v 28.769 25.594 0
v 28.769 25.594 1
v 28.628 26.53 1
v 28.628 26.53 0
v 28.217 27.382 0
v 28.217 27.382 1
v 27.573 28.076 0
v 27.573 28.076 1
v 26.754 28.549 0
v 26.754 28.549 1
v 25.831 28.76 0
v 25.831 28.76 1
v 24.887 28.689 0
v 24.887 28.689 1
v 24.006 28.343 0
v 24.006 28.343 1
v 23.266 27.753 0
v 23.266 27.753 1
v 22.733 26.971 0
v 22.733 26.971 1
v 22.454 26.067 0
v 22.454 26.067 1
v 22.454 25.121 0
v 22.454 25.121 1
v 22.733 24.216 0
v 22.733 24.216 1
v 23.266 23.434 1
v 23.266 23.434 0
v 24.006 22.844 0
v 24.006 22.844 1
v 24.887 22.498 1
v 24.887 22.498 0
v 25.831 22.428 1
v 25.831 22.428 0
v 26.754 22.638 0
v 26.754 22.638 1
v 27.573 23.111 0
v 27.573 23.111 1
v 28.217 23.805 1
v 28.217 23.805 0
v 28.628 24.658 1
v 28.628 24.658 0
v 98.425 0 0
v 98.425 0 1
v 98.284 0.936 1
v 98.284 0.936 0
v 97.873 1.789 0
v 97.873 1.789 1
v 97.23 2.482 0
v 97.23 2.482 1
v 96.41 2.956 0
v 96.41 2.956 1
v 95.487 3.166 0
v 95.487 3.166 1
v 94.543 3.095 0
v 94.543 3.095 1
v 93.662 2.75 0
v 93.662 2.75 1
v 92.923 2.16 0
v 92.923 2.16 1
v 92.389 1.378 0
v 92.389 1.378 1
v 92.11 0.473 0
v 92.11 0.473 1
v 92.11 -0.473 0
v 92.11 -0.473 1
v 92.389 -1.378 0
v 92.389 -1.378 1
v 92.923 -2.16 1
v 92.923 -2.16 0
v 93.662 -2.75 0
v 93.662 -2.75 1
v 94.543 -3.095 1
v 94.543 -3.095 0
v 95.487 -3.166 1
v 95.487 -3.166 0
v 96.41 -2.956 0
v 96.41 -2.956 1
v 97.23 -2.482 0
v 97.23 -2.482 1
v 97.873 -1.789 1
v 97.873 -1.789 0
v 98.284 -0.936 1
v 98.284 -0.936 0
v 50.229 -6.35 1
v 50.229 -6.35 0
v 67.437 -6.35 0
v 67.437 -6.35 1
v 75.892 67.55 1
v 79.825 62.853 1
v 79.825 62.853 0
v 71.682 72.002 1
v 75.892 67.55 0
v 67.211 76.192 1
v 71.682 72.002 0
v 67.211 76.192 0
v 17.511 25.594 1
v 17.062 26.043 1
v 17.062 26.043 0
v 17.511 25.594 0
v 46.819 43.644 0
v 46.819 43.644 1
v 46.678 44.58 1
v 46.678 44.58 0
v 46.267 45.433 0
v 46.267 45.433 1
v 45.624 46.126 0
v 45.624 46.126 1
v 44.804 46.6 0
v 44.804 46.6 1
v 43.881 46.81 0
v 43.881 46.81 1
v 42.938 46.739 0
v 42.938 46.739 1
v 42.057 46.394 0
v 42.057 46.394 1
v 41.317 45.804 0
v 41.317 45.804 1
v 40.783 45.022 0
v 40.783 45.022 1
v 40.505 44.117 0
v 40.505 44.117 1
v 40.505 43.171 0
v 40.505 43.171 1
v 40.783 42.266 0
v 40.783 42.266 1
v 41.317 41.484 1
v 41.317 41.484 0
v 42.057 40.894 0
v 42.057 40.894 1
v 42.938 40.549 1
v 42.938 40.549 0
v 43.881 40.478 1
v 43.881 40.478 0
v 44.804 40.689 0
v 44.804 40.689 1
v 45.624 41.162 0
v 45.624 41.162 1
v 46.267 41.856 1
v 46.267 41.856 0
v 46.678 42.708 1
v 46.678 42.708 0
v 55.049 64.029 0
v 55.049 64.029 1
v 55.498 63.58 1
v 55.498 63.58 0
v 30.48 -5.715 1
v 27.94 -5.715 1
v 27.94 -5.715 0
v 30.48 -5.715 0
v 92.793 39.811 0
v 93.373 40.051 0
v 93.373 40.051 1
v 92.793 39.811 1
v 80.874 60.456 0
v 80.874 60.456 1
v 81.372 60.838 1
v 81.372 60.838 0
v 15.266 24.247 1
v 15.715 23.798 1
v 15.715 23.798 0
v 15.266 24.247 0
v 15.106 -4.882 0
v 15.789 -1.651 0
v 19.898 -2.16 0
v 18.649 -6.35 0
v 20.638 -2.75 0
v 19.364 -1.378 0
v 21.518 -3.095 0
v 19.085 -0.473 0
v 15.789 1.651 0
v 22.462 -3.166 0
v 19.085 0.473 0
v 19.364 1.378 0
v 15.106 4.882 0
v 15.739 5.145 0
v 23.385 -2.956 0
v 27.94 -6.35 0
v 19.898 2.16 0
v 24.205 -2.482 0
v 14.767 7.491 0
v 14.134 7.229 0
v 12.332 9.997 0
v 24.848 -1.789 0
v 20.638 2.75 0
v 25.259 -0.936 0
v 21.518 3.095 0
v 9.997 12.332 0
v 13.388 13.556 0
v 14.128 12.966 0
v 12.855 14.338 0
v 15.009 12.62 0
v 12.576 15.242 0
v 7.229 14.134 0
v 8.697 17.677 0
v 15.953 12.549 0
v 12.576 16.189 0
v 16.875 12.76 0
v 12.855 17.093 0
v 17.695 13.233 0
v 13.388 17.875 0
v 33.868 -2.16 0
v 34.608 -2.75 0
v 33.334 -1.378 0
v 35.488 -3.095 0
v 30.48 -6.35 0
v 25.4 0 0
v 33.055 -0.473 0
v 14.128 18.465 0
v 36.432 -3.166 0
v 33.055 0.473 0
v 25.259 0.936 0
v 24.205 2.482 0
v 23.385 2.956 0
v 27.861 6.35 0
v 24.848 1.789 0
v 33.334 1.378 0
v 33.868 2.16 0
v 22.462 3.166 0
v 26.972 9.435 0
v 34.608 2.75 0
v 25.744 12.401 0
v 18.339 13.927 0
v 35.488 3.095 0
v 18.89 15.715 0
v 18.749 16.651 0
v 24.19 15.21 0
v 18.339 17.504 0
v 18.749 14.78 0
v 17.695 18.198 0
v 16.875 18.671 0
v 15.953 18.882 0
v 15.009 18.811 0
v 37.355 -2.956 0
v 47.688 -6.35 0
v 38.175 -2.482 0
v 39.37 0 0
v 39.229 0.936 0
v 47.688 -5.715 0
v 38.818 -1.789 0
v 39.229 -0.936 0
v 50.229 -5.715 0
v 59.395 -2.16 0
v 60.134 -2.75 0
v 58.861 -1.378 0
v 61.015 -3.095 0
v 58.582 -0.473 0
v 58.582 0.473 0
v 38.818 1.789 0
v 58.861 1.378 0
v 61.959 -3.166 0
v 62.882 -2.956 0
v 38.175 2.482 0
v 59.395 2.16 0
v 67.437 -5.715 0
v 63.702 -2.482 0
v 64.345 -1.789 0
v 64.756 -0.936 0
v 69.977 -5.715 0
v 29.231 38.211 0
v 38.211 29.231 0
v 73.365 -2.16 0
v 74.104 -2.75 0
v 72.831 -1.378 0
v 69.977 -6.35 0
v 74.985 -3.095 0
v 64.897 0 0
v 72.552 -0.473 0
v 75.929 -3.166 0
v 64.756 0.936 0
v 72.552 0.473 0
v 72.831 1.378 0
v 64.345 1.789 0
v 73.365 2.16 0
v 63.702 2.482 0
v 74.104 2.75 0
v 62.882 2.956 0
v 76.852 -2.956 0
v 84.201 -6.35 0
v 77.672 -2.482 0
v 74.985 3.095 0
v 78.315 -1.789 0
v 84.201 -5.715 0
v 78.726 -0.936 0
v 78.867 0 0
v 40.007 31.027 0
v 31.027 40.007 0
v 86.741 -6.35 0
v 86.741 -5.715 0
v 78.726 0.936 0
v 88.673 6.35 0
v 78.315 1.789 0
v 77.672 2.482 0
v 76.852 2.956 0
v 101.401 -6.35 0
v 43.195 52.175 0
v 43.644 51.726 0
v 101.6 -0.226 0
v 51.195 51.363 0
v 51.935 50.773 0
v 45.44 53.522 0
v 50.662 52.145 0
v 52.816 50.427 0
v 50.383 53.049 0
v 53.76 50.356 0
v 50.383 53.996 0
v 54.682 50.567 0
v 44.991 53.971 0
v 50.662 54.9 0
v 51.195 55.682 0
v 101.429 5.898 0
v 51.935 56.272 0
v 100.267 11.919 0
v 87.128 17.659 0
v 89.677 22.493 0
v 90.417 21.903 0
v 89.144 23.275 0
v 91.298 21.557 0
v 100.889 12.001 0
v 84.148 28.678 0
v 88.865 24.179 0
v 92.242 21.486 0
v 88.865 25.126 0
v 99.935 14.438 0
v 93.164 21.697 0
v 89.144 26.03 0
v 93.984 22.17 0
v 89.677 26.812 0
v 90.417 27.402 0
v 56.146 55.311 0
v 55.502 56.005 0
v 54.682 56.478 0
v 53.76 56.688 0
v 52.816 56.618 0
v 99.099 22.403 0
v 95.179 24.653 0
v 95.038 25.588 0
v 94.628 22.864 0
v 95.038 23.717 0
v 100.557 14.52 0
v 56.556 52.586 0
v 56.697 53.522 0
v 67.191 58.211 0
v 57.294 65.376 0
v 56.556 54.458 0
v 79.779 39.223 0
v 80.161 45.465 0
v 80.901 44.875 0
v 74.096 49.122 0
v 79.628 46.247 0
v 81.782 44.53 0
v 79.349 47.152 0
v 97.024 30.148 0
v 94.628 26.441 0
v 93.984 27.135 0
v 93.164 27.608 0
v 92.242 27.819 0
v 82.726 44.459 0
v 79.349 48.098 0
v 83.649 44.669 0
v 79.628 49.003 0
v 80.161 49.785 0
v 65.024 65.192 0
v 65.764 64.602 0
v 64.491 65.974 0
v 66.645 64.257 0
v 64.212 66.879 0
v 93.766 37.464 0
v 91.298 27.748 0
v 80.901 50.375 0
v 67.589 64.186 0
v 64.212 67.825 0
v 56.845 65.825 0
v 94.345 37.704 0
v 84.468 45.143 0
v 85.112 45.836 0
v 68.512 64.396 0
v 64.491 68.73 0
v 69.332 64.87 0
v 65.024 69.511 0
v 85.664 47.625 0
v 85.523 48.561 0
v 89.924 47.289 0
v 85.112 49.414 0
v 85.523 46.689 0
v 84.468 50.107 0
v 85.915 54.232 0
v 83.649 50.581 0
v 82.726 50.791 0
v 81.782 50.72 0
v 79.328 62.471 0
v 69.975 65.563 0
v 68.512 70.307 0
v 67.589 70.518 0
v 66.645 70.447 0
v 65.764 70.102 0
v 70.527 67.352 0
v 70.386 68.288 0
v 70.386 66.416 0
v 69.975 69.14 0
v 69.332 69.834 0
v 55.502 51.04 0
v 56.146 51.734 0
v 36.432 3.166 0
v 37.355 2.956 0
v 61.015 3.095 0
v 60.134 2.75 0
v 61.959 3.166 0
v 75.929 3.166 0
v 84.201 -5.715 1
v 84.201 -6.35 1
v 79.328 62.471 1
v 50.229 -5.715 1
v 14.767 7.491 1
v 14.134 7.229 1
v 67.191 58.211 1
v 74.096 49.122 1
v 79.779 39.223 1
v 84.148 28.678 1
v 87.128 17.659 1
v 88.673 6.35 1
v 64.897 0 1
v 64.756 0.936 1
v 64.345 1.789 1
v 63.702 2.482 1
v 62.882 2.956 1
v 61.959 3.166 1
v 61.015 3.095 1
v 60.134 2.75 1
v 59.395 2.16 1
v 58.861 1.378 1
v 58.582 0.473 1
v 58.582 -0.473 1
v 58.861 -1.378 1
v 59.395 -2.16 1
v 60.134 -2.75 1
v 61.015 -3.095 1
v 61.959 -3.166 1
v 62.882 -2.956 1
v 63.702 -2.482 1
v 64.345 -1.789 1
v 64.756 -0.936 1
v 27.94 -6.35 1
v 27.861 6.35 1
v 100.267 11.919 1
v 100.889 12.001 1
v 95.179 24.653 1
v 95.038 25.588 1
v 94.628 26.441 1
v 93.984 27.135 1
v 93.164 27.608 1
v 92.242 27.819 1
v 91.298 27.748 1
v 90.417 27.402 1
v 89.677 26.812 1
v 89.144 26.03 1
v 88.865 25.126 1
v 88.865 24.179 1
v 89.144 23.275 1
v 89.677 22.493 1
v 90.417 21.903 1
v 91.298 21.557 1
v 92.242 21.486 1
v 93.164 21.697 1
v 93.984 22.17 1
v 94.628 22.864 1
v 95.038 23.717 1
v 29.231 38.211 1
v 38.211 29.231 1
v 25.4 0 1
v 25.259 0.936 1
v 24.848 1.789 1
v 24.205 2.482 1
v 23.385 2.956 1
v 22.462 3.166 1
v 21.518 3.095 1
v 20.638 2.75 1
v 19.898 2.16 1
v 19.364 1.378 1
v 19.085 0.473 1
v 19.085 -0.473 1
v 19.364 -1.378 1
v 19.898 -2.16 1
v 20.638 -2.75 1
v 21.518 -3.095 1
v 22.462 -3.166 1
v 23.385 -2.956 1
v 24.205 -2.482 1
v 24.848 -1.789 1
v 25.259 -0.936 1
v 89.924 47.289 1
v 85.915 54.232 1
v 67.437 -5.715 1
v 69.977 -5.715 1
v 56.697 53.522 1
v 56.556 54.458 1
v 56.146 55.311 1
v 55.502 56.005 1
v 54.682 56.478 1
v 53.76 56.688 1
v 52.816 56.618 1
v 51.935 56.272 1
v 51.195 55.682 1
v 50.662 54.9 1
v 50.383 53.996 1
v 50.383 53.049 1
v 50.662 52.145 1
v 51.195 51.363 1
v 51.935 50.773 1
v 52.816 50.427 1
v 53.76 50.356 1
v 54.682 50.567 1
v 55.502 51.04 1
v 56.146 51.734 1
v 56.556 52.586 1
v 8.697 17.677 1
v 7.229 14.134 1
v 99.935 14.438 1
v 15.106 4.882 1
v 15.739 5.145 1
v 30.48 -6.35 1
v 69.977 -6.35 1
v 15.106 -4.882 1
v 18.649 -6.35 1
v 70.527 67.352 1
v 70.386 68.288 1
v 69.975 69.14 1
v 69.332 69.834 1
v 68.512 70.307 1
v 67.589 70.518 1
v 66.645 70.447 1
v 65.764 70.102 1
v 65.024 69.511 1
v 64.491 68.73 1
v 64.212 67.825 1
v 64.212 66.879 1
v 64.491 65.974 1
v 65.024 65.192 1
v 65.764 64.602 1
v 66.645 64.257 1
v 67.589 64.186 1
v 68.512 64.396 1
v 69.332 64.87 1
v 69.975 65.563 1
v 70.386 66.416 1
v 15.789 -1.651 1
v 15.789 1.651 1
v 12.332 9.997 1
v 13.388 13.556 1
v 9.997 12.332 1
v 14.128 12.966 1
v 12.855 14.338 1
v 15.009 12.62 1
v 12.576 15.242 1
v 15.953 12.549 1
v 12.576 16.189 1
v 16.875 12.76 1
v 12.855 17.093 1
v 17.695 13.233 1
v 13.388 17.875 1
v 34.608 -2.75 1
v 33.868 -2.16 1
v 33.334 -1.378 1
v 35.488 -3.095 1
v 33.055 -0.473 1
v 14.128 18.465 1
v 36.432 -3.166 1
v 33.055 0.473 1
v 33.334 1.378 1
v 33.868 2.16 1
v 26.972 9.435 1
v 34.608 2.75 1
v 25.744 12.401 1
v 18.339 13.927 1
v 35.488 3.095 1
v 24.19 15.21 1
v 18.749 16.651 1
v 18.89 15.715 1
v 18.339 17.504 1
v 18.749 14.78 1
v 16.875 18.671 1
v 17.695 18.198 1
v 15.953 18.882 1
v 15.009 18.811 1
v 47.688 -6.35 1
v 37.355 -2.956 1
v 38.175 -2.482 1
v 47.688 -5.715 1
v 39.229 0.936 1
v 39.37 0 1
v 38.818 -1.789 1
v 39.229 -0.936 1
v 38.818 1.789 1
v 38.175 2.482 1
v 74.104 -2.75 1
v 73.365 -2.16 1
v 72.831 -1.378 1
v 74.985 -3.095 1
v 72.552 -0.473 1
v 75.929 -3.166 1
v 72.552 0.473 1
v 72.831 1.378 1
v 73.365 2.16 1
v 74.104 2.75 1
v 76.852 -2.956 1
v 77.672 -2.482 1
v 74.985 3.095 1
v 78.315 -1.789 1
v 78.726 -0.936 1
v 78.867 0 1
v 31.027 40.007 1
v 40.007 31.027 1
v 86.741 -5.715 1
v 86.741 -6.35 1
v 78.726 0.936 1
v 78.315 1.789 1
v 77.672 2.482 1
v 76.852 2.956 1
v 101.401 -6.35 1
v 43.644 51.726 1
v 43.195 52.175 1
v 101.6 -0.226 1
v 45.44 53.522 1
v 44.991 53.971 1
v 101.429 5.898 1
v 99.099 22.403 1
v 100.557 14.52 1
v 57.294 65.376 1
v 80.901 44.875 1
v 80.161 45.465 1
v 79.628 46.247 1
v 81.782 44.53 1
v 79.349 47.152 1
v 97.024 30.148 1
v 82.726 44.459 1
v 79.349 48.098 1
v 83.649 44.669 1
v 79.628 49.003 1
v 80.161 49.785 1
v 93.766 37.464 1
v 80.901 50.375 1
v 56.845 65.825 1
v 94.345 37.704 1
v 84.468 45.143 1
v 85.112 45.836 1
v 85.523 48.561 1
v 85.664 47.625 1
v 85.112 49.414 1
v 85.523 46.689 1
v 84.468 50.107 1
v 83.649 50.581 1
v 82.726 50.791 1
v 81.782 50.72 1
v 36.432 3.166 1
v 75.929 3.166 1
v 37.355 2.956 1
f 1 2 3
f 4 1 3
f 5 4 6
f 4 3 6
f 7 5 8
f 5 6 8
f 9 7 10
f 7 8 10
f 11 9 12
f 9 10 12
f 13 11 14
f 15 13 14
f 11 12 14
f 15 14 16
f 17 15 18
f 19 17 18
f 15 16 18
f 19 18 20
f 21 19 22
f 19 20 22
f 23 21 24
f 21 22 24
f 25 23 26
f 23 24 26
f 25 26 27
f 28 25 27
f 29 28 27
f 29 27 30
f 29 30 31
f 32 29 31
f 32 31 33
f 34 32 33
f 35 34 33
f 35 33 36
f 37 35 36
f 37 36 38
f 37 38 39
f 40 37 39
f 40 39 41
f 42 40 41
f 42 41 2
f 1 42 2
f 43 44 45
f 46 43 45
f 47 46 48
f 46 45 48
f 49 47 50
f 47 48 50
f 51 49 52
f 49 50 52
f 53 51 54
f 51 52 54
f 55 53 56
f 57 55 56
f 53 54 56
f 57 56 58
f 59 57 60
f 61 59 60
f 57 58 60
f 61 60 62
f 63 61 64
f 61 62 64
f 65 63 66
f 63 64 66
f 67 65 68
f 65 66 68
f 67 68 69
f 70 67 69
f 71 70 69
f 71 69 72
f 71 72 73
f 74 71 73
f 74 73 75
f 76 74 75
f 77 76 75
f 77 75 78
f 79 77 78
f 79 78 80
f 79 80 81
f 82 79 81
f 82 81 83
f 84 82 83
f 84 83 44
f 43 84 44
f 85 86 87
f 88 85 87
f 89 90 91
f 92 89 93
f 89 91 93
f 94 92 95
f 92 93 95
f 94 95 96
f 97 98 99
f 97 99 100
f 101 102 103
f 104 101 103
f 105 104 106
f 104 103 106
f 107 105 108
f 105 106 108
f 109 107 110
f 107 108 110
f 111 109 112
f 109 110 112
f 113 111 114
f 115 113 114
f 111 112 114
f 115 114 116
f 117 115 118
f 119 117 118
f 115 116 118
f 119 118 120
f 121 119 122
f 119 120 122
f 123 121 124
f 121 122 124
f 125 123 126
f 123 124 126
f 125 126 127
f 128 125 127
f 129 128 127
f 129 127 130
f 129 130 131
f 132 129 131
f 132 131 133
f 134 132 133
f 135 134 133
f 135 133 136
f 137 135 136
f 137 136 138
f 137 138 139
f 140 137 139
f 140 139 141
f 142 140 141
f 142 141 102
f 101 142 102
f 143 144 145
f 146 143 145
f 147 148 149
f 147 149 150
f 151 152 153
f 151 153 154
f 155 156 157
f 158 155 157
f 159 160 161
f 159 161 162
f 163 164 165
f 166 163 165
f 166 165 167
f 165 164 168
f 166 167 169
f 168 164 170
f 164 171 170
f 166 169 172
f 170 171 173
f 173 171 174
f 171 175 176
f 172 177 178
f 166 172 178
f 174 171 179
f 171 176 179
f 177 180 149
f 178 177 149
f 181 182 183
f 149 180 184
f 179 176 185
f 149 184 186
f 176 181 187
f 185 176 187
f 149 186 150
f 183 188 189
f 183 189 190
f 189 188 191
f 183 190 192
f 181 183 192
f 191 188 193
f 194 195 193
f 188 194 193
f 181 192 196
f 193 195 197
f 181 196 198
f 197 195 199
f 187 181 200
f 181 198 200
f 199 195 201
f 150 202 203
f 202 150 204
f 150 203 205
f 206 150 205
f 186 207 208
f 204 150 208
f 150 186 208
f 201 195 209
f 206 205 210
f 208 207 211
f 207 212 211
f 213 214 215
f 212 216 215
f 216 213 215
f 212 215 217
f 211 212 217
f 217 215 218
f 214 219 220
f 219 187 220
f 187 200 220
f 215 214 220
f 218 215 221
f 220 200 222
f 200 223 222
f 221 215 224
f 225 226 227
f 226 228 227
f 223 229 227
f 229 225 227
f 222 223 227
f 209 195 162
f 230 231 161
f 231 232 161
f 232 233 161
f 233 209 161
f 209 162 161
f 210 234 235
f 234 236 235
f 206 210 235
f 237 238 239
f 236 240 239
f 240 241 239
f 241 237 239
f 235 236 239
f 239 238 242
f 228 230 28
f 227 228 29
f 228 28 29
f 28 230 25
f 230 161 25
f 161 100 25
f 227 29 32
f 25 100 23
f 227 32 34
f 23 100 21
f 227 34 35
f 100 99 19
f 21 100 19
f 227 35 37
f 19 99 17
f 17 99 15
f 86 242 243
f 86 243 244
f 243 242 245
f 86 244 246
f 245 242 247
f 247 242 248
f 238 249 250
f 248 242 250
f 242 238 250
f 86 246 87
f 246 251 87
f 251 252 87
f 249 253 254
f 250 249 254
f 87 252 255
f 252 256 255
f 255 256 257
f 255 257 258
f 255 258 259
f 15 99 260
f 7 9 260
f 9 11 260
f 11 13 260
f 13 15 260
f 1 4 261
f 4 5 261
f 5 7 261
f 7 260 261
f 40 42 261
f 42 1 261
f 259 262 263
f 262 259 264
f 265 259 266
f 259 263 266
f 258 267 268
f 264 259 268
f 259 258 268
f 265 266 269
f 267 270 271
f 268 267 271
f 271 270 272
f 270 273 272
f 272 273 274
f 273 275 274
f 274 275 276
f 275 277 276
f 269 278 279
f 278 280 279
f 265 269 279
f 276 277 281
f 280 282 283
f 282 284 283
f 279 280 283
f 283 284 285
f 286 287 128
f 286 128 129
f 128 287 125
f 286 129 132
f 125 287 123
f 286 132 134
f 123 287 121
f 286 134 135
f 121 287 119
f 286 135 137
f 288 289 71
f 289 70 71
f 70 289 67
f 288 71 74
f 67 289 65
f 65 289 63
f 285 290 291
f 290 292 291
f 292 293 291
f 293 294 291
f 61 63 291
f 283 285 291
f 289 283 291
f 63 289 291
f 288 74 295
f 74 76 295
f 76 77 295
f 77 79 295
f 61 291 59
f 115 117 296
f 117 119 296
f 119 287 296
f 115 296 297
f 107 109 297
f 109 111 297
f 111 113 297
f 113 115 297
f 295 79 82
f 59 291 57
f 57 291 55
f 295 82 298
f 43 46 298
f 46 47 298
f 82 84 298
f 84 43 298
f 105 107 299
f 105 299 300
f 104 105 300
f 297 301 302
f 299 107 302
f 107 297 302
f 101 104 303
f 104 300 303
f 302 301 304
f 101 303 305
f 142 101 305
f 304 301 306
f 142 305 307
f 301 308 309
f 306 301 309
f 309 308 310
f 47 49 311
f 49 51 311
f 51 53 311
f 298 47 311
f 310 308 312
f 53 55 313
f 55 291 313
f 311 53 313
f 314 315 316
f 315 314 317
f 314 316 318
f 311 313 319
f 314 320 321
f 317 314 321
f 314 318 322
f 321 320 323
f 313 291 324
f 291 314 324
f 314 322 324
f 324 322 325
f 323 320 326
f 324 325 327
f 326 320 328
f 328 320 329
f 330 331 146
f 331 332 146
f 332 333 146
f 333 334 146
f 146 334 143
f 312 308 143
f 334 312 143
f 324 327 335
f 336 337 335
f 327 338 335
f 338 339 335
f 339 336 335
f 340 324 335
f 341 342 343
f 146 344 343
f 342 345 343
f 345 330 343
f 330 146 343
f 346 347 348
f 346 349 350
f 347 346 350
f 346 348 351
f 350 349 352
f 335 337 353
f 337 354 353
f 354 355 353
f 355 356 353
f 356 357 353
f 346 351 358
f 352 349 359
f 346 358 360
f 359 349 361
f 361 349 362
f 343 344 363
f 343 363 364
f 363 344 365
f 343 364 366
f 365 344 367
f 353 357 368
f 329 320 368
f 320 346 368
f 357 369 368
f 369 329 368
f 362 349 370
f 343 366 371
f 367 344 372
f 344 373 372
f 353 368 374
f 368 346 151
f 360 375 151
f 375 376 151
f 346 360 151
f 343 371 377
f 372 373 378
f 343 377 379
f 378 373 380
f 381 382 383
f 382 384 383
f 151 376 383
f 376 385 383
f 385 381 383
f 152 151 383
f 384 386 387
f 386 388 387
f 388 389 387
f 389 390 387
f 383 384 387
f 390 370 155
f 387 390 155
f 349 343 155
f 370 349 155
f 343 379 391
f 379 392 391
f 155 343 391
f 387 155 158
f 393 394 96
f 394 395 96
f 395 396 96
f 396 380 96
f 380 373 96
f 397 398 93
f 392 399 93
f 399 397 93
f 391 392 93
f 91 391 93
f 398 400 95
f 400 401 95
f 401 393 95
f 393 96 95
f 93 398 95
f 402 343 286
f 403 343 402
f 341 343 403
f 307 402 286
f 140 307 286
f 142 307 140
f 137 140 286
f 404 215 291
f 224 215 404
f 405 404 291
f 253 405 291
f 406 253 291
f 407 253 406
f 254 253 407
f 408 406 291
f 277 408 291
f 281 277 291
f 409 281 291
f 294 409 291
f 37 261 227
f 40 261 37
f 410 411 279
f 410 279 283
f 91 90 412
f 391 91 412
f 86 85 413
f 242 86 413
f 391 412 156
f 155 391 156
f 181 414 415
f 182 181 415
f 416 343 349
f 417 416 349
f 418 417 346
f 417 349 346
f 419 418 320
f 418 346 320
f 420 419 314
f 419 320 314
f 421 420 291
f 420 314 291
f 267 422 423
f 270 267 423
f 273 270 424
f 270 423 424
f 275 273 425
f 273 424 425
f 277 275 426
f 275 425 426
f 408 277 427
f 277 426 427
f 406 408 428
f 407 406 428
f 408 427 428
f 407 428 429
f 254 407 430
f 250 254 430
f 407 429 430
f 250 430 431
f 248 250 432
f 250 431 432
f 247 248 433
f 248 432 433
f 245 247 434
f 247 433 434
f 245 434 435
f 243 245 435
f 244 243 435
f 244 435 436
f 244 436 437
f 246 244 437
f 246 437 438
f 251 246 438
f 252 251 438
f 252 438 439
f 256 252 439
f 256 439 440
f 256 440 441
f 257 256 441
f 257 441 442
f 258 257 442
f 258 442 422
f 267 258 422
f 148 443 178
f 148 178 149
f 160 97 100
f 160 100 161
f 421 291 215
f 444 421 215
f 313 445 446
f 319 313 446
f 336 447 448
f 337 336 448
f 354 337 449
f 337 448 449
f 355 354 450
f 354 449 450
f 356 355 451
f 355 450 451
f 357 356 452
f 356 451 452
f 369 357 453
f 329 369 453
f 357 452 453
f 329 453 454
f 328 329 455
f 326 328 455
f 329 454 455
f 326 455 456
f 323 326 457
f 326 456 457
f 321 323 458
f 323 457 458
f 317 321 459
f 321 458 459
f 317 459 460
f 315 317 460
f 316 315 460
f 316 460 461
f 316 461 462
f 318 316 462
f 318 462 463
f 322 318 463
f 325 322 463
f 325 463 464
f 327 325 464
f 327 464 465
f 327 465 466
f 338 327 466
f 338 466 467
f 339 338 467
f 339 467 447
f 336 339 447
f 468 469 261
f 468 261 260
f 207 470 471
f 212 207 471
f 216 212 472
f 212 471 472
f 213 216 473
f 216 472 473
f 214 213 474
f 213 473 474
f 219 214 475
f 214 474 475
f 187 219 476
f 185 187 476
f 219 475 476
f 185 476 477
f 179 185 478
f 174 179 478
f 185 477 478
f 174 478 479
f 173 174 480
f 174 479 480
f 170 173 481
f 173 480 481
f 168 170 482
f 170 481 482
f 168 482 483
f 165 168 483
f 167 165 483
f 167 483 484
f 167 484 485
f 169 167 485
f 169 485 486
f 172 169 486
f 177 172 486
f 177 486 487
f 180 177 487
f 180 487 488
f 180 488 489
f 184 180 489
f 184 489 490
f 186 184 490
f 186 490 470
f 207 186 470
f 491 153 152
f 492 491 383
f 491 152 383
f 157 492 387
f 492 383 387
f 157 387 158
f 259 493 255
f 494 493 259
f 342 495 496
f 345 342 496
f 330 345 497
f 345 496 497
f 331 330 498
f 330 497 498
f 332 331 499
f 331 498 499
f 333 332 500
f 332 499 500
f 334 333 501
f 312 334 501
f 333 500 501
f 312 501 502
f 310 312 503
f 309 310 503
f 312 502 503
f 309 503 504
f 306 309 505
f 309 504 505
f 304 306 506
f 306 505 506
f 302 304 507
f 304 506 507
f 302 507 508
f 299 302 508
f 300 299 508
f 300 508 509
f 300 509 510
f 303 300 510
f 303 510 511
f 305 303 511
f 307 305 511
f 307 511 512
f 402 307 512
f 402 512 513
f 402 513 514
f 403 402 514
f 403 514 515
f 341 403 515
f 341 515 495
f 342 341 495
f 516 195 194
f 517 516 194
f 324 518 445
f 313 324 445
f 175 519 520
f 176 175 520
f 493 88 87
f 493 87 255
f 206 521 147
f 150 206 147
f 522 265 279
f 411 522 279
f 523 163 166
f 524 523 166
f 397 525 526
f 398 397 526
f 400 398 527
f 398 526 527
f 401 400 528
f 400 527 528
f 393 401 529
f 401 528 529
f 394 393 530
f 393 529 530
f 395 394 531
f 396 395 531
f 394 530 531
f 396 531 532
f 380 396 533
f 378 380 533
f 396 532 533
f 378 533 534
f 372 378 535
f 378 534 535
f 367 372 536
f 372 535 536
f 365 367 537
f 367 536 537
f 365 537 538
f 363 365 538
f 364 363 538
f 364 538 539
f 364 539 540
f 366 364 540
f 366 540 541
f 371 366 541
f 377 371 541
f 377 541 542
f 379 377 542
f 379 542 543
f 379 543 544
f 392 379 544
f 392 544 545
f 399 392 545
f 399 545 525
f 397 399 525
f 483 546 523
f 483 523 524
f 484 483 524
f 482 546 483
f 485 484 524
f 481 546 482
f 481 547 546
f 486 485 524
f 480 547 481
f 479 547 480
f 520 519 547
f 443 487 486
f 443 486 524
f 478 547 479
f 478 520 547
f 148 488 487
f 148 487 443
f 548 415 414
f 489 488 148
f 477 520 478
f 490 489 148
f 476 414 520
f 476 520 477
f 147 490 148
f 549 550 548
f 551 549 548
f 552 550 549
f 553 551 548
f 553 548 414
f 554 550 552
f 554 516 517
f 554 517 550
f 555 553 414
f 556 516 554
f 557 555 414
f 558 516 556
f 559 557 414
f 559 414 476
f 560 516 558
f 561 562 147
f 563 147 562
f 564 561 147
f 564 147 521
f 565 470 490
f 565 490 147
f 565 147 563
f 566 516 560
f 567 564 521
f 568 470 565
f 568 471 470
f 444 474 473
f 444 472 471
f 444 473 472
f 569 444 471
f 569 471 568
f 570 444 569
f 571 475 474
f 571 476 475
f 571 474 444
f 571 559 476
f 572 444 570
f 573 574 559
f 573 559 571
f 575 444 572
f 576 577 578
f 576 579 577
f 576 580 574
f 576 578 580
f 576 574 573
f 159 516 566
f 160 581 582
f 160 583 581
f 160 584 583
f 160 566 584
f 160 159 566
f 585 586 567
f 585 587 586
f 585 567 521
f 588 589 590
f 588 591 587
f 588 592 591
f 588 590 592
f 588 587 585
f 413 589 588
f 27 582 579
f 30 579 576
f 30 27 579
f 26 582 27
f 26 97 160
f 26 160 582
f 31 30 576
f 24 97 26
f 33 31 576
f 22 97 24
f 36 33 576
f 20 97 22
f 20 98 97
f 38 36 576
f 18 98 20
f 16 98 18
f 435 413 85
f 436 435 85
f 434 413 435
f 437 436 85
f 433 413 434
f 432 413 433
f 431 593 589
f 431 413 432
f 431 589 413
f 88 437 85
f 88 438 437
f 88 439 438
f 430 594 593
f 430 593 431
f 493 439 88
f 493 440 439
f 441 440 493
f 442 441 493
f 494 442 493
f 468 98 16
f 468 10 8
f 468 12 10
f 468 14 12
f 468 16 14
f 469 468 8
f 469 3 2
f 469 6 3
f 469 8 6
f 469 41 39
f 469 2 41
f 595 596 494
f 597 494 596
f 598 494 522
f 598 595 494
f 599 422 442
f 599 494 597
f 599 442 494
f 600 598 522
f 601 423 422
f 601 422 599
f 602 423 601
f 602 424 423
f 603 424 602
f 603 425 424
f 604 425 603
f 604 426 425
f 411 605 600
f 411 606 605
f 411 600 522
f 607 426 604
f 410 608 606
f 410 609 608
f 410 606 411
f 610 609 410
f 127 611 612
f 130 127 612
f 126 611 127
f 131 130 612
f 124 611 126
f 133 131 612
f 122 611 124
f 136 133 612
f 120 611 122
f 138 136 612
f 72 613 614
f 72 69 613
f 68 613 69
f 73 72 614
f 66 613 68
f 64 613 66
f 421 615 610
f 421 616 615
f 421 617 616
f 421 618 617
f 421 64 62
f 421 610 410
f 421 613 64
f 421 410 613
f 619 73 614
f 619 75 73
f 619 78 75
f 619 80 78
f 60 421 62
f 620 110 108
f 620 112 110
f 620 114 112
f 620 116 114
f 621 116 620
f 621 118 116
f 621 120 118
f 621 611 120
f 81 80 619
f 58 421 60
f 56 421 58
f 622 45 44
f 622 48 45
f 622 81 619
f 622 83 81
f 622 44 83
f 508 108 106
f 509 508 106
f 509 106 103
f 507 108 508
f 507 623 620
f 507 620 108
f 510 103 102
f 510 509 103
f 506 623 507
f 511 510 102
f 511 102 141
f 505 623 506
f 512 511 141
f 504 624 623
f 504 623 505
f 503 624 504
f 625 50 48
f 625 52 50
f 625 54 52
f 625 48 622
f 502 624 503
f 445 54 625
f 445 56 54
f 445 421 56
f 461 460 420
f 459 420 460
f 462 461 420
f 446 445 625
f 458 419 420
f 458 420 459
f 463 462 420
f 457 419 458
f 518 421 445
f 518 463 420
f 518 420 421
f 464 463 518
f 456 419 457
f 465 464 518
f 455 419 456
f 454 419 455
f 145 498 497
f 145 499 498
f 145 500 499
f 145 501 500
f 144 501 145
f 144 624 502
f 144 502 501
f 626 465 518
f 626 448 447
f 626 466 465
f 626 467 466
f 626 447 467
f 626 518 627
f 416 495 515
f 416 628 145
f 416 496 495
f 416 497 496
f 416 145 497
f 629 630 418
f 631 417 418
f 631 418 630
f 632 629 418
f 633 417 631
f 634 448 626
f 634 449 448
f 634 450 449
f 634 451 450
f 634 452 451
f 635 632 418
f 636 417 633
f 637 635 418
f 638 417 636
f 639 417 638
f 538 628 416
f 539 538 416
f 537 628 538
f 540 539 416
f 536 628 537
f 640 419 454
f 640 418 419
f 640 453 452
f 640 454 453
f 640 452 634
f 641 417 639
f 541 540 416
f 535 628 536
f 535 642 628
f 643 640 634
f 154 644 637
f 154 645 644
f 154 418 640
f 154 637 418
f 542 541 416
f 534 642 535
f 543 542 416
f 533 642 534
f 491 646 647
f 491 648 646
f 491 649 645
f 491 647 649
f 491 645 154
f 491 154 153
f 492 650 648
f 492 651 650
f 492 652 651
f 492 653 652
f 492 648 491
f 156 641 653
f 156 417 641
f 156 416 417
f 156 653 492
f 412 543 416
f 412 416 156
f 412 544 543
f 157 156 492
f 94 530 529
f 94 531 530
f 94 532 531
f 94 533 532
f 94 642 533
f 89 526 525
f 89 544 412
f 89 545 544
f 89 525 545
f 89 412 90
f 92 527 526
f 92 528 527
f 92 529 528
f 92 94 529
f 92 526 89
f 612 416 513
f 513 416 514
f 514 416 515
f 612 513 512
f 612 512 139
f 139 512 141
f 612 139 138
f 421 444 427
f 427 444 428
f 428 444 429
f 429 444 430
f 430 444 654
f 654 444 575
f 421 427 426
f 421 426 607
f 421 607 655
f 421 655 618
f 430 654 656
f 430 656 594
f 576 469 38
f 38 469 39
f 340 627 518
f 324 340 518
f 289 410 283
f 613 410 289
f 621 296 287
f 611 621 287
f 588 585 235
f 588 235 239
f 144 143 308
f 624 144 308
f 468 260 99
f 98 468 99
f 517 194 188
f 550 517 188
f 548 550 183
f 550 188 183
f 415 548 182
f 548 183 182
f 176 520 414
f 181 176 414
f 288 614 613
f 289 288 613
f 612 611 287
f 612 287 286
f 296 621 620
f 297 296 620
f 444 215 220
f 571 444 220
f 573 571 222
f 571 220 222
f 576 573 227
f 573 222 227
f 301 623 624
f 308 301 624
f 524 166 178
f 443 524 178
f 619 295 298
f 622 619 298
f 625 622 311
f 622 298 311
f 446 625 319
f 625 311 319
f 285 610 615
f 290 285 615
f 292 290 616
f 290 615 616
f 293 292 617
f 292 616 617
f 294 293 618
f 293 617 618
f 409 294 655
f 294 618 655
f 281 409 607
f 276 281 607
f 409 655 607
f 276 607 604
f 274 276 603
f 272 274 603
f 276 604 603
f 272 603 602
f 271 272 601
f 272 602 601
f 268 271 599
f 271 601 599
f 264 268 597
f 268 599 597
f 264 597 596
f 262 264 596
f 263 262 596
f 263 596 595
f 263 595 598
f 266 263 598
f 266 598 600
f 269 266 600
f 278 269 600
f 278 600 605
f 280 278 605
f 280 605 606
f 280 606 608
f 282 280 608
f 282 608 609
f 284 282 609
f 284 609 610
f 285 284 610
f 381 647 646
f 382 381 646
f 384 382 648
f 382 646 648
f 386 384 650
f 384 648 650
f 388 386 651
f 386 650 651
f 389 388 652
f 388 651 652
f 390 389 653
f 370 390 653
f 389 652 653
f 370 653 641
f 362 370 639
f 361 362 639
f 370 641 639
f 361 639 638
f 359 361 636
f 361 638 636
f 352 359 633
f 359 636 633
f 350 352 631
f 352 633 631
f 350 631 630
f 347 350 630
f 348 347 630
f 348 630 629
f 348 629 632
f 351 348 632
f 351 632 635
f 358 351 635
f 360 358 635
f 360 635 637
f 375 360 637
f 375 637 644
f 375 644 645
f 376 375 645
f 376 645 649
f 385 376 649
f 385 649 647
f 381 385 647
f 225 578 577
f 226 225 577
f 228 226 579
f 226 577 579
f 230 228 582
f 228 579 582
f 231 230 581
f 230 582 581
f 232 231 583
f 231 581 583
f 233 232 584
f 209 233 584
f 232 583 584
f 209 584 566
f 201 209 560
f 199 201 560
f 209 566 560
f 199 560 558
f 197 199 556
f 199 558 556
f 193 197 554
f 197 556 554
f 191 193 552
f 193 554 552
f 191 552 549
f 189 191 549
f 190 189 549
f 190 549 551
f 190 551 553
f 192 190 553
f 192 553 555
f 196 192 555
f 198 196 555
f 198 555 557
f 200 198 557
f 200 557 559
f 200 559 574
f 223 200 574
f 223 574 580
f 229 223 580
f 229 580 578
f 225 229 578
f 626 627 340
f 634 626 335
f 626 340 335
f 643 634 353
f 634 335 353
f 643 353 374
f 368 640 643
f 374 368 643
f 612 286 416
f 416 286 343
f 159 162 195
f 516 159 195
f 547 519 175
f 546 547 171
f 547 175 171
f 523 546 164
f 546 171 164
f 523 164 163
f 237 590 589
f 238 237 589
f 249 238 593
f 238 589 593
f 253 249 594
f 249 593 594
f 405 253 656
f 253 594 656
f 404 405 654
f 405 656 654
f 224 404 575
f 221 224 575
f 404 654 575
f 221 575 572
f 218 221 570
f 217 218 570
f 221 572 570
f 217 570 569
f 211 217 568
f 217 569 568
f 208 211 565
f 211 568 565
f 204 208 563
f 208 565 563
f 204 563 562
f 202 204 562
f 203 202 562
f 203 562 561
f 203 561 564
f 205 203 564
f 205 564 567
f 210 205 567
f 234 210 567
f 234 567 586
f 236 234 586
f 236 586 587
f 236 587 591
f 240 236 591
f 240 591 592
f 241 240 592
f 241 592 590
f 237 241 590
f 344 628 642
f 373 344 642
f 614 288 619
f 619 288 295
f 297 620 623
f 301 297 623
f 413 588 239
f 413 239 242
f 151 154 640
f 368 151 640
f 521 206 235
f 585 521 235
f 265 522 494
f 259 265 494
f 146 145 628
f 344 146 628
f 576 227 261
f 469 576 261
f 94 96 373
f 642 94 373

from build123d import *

# Parameters (mm, degrees)
BOSS_EXTRUDE1_DEPTH = 1
SKETCH2_R           = 3.175
CUT_EXTRUDE1_DEPTH  = 2
SKETCH3_W           = 2.54
SKETCH3_H           = 0.635
CUT_EXTRUDE2_DEPTH  = 2


with BuildPart() as part:
    # Sketch1 → Boss-Extrude1 (new body)
    with BuildSketch(Plane.XY):
        with BuildLine():
            Line((67.21146711, 76.191723231), (8.696654013, 17.676910134))
            Line((8.696654013, 17.676910134), (7.228954972, 14.133571205))
            ThreePointArc((7.228954972, 14.133571205), (14.666587579, 6.075099489), (15.105587123, -4.88230096))
            Line((15.105587123, -4.88230096), (18.648926052, -6.35))
            Line((18.648926052, -6.35), (101.401368334, -6.35))
            ThreePointArc((101.401368334, -6.35), (93.866160503, 38.880636728), (67.21146711, 76.191723231))
        make_face()
        with BuildLine():
            Line((88.672924278, 6.35), (27.86051193, 6.35))
            ThreePointArc((27.86051193, 6.35), (26.399857642, 10.93517908), (24.190484974, 15.210228852))
            Line((24.190484974, 15.210228852), (67.191354125, 58.211098004))
            ThreePointArc((67.191354125, 58.211098004), (82.13289044, 34.020557137), (88.672924278, 6.35))
        make_face(mode=Mode.SUBTRACT)
    extrude(amount=BOSS_EXTRUDE1_DEPTH)

    # Sketch2 → Cut-Extrude1 (cut, through all)
    with BuildSketch(Plane.XY.offset(1)):
        with Locations((22.225, 0)):
            Circle(SKETCH2_R)
        with Locations((36.195, 0)):
            Circle(SKETCH2_R)
        with Locations((61.722, 0)):
            Circle(SKETCH2_R)
        with Locations((75.692, 0)):
            Circle(SKETCH2_R)
        with Locations((95.25, 0)):
            Circle(SKETCH2_R)
        with Locations((15.715448212, 15.715448212)):
            Circle(SKETCH2_R)
        with Locations((25.593729945, 25.593729945)):
            Circle(SKETCH2_R)
        with Locations((43.644044748, 43.644044748)):
            Circle(SKETCH2_R)
        with Locations((53.522326482, 53.522326482)):
            Circle(SKETCH2_R)
        with Locations((92.004434954, 24.652514046)):
            Circle(SKETCH2_R)
        with Locations((82.48891971, 47.625)):
            Circle(SKETCH2_R)
        with Locations((67.351920908, 67.351920908)):
            Circle(SKETCH2_R)
    extrude(amount=-CUT_EXTRUDE1_DEPTH, mode=Mode.SUBTRACT)

    # Sketch3 → Cut-Extrude2 (cut, through all)
    with BuildSketch(Plane.XY.offset(1)):
        Polygon((15.266435406, 24.246691527), (17.06248663, 26.042742751), (17.511499436, 25.593729945), (15.715448212, 23.797678721), align=None)
        Polygon((44.991083167, 53.971339288), (43.195031942, 52.175288063), (43.644044748, 51.726275257), (45.440095973, 53.522326482), align=None)
        with Locations((29.21, -6.0325)):
            Rectangle(SKETCH3_W, SKETCH3_H)
        with Locations((68.707, -6.0325)):
            Rectangle(SKETCH3_W, SKETCH3_H)
        Polygon((29.230733674, 38.210989795), (31.026784898, 40.007041019), (40.007041019, 31.026784898), (38.210989795, 29.230733674), align=None)
        Polygon((56.845021246, 65.825277367), (55.048970022, 64.029226143), (55.497982828, 63.580213337), (57.294034052, 65.376264561), align=None)
        with Locations((48.9585, -6.0325)):
            Rectangle(SKETCH3_W, SKETCH3_H)
        with Locations((85.471, -6.0325)):
            Rectangle(SKETCH3_W, SKETCH3_H)
        Polygon((99.935462164, 14.437711971), (100.266998693, 11.919442024), (101.526133667, 12.085210288), (101.194597138, 14.603480236), align=None)
        Polygon((93.765504959, 37.464305742), (94.938831965, 37.950313702), (93.966816047, 40.296967714), (92.793489041, 39.810959755), align=None)
        Polygon((79.327792988, 62.471156422), (80.874047017, 60.456038938), (81.88160576, 61.229165953), (80.33535173, 63.244283437), align=None)
        Polygon((13.593916116, 7.005422516), (14.565932035, 4.658768503), (15.739259041, 5.144776462), (14.767243123, 7.491430475), align=None)
    extrude(amount=-CUT_EXTRUDE2_DEPTH, mode=Mode.SUBTRACT)


solid = part.part
